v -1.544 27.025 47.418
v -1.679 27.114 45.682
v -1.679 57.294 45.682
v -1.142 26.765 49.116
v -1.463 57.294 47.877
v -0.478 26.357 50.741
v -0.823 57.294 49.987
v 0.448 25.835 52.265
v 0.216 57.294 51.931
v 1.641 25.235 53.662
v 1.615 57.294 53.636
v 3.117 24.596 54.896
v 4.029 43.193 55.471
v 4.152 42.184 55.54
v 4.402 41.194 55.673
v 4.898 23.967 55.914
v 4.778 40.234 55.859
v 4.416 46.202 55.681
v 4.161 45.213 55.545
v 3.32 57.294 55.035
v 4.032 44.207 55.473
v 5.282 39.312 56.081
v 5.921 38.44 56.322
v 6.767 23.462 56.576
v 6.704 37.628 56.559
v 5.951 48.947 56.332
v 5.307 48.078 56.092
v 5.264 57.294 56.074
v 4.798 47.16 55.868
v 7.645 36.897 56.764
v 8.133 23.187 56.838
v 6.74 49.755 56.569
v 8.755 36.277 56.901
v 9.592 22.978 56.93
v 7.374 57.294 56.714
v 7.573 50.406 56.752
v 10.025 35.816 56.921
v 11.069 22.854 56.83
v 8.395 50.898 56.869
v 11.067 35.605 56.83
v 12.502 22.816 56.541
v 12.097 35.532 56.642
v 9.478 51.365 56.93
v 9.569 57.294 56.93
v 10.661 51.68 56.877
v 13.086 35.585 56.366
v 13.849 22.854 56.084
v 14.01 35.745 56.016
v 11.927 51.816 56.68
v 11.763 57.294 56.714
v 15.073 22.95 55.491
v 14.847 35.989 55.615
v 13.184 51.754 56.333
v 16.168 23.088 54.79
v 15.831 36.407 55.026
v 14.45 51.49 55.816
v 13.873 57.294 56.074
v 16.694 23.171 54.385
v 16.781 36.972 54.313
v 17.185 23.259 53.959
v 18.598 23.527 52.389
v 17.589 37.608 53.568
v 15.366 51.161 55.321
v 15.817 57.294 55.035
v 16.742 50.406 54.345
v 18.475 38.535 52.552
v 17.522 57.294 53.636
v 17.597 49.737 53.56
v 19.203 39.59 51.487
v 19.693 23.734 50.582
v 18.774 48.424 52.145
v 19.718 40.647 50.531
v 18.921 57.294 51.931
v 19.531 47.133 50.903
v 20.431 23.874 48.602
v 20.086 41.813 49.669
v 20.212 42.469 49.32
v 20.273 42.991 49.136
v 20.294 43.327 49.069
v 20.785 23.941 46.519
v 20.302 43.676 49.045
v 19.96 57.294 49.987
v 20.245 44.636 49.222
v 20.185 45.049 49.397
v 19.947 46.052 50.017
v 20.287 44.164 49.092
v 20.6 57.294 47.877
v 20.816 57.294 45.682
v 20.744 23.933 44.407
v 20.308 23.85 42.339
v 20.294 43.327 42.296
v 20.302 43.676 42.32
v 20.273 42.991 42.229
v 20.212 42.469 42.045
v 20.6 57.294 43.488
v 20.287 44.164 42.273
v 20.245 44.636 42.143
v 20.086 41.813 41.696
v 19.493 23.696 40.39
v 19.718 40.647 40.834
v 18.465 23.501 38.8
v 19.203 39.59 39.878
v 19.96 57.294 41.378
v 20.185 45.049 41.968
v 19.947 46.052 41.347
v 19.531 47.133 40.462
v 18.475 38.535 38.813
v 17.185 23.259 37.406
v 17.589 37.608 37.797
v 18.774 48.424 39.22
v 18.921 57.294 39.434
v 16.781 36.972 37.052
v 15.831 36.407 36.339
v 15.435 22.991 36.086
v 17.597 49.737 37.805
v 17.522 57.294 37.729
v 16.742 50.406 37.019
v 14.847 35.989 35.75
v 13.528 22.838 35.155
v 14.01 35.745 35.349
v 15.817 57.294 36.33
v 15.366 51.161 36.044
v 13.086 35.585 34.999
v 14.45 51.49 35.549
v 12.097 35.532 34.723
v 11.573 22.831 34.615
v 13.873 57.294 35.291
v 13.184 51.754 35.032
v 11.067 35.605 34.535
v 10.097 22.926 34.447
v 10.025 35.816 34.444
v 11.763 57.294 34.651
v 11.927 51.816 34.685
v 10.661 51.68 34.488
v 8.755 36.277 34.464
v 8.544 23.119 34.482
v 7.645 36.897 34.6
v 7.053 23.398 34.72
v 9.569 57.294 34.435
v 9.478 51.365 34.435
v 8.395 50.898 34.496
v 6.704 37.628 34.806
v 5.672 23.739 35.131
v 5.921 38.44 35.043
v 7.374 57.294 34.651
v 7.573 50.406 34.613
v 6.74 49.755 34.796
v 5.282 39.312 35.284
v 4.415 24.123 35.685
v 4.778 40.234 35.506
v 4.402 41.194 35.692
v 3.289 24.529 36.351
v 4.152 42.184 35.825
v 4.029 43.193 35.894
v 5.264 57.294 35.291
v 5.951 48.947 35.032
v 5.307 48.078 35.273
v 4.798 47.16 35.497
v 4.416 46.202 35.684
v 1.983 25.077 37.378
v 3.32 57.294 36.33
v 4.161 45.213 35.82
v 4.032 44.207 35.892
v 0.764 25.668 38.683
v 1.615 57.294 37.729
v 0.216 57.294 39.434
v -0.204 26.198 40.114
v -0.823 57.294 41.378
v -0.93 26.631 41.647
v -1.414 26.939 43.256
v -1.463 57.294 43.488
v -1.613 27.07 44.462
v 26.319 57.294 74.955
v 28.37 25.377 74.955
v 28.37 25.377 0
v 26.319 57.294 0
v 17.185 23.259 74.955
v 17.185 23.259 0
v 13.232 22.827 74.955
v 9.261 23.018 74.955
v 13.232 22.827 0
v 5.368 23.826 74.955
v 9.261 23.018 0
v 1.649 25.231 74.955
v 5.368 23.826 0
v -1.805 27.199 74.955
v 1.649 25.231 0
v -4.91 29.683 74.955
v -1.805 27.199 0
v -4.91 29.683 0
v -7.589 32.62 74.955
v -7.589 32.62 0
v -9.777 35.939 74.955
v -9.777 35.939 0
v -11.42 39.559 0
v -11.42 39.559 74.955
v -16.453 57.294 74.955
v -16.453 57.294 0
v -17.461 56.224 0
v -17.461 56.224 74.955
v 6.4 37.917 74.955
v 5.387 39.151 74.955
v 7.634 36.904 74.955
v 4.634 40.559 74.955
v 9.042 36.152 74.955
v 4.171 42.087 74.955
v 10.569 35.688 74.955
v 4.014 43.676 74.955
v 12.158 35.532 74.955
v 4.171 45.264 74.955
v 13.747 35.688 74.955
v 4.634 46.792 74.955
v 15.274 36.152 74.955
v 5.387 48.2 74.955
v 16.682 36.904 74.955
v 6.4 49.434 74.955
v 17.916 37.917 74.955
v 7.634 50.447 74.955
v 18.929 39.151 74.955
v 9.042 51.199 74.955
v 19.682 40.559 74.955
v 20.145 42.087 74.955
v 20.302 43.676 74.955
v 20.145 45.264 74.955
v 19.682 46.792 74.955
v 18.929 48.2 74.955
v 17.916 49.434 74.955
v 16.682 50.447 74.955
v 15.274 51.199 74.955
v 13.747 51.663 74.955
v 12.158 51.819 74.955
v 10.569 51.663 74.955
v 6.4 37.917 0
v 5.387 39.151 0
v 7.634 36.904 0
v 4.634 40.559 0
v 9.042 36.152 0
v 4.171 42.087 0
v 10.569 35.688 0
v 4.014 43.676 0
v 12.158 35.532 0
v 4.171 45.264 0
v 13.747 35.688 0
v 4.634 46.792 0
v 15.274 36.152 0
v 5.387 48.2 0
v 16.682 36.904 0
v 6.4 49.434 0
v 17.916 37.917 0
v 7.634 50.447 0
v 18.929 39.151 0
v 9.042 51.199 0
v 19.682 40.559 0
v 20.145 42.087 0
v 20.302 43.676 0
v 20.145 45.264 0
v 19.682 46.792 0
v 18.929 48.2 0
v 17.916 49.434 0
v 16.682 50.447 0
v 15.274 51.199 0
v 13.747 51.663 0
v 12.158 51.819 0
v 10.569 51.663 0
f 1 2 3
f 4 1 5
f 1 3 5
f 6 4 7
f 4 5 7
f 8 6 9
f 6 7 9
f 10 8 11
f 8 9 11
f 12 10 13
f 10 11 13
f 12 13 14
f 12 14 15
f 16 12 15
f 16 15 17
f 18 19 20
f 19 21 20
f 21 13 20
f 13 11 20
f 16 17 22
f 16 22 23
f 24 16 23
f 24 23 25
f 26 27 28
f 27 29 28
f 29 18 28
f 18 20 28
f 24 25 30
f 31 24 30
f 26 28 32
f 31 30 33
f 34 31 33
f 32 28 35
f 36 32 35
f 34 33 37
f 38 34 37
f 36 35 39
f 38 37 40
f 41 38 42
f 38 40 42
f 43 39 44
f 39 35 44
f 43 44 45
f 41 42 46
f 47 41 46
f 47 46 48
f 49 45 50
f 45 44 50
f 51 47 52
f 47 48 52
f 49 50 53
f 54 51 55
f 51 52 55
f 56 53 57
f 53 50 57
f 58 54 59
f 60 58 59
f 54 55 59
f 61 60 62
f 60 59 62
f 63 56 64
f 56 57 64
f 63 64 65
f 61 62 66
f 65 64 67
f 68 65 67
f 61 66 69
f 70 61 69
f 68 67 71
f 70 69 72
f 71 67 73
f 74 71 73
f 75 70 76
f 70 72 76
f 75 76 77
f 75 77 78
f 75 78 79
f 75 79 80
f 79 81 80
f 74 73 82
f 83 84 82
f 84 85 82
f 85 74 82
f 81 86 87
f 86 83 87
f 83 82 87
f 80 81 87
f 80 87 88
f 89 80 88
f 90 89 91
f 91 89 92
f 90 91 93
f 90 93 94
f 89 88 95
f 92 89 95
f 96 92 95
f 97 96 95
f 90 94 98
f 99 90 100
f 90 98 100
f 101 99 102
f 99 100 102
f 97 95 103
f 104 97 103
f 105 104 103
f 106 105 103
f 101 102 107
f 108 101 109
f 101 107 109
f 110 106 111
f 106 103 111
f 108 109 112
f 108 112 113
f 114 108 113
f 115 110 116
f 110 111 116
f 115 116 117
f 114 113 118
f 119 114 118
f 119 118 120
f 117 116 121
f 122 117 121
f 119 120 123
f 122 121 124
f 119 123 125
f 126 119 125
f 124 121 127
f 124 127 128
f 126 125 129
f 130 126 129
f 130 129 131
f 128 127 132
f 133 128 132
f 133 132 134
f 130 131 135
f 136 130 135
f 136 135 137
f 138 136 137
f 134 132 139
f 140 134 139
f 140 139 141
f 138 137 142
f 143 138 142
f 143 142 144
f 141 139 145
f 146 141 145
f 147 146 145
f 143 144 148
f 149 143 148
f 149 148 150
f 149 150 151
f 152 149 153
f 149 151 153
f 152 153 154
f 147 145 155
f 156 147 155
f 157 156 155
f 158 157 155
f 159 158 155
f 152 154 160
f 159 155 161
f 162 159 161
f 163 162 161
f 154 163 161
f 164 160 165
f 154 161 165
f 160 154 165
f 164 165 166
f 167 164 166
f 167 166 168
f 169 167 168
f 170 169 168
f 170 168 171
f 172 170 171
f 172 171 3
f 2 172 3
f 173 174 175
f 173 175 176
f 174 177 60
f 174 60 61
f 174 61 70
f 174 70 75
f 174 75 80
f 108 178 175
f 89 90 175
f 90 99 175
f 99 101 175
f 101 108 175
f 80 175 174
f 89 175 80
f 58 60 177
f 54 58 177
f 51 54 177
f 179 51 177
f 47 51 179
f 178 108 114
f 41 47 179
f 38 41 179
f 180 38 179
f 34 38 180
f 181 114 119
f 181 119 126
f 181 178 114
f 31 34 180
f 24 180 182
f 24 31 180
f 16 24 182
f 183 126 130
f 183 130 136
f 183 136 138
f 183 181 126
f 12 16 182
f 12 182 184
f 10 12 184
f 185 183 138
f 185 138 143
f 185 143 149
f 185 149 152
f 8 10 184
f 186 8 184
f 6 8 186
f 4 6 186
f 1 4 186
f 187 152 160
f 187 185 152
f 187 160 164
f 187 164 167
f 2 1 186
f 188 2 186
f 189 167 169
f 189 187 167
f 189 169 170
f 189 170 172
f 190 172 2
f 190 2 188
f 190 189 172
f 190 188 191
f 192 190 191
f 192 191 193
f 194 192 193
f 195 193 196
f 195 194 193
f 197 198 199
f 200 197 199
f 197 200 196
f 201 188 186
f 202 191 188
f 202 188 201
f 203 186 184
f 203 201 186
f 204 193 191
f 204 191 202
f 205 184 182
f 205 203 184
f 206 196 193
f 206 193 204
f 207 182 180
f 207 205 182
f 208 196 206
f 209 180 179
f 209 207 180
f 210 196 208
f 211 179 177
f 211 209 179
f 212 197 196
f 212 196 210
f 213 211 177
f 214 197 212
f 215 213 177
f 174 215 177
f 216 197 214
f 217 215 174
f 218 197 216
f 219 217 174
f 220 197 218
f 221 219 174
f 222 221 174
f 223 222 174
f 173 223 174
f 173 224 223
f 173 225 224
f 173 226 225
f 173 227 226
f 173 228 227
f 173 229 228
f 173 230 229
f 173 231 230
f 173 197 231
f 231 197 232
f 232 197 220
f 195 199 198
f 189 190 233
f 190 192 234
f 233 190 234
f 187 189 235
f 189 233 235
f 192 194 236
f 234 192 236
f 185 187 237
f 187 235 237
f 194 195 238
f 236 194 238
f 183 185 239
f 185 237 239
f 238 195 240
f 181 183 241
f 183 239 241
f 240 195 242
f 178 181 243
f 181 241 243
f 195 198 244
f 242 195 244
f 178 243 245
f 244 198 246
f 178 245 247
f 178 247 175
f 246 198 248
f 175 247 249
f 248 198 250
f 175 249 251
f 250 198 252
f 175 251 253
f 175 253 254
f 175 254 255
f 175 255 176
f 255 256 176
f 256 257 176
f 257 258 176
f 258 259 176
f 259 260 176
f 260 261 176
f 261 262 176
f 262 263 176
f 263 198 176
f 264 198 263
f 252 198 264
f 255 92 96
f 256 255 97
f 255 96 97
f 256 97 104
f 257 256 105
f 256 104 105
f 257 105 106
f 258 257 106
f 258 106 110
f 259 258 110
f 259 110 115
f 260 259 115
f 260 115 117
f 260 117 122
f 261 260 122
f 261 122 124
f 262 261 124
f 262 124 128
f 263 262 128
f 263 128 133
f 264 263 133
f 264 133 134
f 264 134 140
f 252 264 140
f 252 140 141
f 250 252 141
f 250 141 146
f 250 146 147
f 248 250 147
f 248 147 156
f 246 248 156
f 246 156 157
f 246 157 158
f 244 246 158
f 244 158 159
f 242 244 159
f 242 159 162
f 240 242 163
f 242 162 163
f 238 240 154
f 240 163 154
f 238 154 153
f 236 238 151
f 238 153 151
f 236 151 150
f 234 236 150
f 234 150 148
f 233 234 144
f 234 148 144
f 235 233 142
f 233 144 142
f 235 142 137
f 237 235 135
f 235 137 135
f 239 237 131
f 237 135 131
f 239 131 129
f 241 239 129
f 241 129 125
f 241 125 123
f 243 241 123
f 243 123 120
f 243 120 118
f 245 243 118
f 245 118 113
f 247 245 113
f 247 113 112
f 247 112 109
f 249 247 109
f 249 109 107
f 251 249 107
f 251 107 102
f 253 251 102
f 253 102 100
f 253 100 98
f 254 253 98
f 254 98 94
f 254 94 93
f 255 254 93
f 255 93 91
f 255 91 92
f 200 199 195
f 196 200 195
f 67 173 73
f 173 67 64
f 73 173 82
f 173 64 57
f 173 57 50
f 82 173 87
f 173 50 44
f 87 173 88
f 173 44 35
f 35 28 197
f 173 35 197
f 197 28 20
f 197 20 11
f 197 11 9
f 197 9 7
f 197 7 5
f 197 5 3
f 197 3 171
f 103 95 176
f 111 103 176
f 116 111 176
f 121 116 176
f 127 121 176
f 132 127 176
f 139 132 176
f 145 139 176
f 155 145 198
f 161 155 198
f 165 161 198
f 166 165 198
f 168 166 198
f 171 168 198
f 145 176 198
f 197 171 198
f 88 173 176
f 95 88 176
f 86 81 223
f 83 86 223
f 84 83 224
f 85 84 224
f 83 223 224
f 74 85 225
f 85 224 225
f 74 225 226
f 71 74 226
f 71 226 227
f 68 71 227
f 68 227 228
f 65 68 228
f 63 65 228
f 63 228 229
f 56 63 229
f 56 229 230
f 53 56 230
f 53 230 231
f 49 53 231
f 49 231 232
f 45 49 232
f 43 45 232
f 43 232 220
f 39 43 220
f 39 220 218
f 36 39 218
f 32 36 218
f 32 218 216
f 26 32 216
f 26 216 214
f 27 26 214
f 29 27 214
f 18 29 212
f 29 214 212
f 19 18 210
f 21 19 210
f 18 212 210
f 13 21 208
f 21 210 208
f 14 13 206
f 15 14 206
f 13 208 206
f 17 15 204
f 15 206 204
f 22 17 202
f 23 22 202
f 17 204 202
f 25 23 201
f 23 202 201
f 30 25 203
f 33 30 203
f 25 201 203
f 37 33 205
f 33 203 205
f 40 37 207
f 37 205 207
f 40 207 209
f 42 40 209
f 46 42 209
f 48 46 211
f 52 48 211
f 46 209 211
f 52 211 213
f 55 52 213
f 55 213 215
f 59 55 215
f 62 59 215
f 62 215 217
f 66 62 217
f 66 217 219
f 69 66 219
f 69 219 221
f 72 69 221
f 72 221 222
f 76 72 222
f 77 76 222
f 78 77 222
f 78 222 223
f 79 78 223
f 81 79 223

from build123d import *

# Parameters (mm, degrees)
F1_DEPTH    = 74.9545320868
F2_R        = 8.1435947288
F3_DEPTH    = 124.2861971259
F5_R        = 11.2476479719
F6_DEPTH    = 38.057185469
F7_T1_DEPTH = 183.0316575771


# Not quite as in the source:
# - a fillet or chamfer that OpenCascade refuses, or shapes differently, is made with other operations: its cross-section is extruded or revolved along the edge and cut away or added


with BuildPart() as f1:
    # F0 (on Top) → F1 (new body)
    with BuildSketch(Plane.XY):
        Polygon((26.3189487159, 57.2941713035), (-16.4525061846, 57.2941713035), (-17.4609050155, 56.2243200839), (-4.0535703301, 19.2379858345), (28.3696912229, 25.376688689), align=None)
    extrude(amount=F1_DEPTH)

    # F2 (on face) → F3 (cut)
    with BuildSketch(Plane.XY.offset(74.9545320868)):
        with Locations((12.1580604464, 43.6755083501)):
            Circle(F2_R)
    extrude(amount=-F3_DEPTH, mode=Mode.SUBTRACT)

    # F5 (on face) → F6 (cut, through all)
    with BuildSketch(Plane(origin=(0, 57.2941713035, 0), x_dir=(-1, 0, 0), z_dir=(0, 1, 0))):
        with Locations((-9.5685087144, 45.682426542)):
            Circle(F5_R)
    extrude(amount=-F6_DEPTH, mode=Mode.SUBTRACT)

    # F7: fillet of radius 25.4 on 1 edges, made by hand

    # F7_s2 → F7_t1 (cut)
    with BuildSketch(Plane.XY.offset(-54.0385627451)):
        with BuildLine():
            ThreePointArc((17.1845559853, 23.2590047077), (-0.1162411856, 26.147331869), (-11.4199898846, 39.559463761))
            Line((-11.4199898846, 39.559463761), (-4.0535703301, 19.2379858345))
            Line((-4.0535703301, 19.2379858345), (17.1845559853, 23.2590047077))
        make_face()
    extrude(amount=F7_T1_DEPTH, mode=Mode.SUBTRACT)


solid = f1.part
